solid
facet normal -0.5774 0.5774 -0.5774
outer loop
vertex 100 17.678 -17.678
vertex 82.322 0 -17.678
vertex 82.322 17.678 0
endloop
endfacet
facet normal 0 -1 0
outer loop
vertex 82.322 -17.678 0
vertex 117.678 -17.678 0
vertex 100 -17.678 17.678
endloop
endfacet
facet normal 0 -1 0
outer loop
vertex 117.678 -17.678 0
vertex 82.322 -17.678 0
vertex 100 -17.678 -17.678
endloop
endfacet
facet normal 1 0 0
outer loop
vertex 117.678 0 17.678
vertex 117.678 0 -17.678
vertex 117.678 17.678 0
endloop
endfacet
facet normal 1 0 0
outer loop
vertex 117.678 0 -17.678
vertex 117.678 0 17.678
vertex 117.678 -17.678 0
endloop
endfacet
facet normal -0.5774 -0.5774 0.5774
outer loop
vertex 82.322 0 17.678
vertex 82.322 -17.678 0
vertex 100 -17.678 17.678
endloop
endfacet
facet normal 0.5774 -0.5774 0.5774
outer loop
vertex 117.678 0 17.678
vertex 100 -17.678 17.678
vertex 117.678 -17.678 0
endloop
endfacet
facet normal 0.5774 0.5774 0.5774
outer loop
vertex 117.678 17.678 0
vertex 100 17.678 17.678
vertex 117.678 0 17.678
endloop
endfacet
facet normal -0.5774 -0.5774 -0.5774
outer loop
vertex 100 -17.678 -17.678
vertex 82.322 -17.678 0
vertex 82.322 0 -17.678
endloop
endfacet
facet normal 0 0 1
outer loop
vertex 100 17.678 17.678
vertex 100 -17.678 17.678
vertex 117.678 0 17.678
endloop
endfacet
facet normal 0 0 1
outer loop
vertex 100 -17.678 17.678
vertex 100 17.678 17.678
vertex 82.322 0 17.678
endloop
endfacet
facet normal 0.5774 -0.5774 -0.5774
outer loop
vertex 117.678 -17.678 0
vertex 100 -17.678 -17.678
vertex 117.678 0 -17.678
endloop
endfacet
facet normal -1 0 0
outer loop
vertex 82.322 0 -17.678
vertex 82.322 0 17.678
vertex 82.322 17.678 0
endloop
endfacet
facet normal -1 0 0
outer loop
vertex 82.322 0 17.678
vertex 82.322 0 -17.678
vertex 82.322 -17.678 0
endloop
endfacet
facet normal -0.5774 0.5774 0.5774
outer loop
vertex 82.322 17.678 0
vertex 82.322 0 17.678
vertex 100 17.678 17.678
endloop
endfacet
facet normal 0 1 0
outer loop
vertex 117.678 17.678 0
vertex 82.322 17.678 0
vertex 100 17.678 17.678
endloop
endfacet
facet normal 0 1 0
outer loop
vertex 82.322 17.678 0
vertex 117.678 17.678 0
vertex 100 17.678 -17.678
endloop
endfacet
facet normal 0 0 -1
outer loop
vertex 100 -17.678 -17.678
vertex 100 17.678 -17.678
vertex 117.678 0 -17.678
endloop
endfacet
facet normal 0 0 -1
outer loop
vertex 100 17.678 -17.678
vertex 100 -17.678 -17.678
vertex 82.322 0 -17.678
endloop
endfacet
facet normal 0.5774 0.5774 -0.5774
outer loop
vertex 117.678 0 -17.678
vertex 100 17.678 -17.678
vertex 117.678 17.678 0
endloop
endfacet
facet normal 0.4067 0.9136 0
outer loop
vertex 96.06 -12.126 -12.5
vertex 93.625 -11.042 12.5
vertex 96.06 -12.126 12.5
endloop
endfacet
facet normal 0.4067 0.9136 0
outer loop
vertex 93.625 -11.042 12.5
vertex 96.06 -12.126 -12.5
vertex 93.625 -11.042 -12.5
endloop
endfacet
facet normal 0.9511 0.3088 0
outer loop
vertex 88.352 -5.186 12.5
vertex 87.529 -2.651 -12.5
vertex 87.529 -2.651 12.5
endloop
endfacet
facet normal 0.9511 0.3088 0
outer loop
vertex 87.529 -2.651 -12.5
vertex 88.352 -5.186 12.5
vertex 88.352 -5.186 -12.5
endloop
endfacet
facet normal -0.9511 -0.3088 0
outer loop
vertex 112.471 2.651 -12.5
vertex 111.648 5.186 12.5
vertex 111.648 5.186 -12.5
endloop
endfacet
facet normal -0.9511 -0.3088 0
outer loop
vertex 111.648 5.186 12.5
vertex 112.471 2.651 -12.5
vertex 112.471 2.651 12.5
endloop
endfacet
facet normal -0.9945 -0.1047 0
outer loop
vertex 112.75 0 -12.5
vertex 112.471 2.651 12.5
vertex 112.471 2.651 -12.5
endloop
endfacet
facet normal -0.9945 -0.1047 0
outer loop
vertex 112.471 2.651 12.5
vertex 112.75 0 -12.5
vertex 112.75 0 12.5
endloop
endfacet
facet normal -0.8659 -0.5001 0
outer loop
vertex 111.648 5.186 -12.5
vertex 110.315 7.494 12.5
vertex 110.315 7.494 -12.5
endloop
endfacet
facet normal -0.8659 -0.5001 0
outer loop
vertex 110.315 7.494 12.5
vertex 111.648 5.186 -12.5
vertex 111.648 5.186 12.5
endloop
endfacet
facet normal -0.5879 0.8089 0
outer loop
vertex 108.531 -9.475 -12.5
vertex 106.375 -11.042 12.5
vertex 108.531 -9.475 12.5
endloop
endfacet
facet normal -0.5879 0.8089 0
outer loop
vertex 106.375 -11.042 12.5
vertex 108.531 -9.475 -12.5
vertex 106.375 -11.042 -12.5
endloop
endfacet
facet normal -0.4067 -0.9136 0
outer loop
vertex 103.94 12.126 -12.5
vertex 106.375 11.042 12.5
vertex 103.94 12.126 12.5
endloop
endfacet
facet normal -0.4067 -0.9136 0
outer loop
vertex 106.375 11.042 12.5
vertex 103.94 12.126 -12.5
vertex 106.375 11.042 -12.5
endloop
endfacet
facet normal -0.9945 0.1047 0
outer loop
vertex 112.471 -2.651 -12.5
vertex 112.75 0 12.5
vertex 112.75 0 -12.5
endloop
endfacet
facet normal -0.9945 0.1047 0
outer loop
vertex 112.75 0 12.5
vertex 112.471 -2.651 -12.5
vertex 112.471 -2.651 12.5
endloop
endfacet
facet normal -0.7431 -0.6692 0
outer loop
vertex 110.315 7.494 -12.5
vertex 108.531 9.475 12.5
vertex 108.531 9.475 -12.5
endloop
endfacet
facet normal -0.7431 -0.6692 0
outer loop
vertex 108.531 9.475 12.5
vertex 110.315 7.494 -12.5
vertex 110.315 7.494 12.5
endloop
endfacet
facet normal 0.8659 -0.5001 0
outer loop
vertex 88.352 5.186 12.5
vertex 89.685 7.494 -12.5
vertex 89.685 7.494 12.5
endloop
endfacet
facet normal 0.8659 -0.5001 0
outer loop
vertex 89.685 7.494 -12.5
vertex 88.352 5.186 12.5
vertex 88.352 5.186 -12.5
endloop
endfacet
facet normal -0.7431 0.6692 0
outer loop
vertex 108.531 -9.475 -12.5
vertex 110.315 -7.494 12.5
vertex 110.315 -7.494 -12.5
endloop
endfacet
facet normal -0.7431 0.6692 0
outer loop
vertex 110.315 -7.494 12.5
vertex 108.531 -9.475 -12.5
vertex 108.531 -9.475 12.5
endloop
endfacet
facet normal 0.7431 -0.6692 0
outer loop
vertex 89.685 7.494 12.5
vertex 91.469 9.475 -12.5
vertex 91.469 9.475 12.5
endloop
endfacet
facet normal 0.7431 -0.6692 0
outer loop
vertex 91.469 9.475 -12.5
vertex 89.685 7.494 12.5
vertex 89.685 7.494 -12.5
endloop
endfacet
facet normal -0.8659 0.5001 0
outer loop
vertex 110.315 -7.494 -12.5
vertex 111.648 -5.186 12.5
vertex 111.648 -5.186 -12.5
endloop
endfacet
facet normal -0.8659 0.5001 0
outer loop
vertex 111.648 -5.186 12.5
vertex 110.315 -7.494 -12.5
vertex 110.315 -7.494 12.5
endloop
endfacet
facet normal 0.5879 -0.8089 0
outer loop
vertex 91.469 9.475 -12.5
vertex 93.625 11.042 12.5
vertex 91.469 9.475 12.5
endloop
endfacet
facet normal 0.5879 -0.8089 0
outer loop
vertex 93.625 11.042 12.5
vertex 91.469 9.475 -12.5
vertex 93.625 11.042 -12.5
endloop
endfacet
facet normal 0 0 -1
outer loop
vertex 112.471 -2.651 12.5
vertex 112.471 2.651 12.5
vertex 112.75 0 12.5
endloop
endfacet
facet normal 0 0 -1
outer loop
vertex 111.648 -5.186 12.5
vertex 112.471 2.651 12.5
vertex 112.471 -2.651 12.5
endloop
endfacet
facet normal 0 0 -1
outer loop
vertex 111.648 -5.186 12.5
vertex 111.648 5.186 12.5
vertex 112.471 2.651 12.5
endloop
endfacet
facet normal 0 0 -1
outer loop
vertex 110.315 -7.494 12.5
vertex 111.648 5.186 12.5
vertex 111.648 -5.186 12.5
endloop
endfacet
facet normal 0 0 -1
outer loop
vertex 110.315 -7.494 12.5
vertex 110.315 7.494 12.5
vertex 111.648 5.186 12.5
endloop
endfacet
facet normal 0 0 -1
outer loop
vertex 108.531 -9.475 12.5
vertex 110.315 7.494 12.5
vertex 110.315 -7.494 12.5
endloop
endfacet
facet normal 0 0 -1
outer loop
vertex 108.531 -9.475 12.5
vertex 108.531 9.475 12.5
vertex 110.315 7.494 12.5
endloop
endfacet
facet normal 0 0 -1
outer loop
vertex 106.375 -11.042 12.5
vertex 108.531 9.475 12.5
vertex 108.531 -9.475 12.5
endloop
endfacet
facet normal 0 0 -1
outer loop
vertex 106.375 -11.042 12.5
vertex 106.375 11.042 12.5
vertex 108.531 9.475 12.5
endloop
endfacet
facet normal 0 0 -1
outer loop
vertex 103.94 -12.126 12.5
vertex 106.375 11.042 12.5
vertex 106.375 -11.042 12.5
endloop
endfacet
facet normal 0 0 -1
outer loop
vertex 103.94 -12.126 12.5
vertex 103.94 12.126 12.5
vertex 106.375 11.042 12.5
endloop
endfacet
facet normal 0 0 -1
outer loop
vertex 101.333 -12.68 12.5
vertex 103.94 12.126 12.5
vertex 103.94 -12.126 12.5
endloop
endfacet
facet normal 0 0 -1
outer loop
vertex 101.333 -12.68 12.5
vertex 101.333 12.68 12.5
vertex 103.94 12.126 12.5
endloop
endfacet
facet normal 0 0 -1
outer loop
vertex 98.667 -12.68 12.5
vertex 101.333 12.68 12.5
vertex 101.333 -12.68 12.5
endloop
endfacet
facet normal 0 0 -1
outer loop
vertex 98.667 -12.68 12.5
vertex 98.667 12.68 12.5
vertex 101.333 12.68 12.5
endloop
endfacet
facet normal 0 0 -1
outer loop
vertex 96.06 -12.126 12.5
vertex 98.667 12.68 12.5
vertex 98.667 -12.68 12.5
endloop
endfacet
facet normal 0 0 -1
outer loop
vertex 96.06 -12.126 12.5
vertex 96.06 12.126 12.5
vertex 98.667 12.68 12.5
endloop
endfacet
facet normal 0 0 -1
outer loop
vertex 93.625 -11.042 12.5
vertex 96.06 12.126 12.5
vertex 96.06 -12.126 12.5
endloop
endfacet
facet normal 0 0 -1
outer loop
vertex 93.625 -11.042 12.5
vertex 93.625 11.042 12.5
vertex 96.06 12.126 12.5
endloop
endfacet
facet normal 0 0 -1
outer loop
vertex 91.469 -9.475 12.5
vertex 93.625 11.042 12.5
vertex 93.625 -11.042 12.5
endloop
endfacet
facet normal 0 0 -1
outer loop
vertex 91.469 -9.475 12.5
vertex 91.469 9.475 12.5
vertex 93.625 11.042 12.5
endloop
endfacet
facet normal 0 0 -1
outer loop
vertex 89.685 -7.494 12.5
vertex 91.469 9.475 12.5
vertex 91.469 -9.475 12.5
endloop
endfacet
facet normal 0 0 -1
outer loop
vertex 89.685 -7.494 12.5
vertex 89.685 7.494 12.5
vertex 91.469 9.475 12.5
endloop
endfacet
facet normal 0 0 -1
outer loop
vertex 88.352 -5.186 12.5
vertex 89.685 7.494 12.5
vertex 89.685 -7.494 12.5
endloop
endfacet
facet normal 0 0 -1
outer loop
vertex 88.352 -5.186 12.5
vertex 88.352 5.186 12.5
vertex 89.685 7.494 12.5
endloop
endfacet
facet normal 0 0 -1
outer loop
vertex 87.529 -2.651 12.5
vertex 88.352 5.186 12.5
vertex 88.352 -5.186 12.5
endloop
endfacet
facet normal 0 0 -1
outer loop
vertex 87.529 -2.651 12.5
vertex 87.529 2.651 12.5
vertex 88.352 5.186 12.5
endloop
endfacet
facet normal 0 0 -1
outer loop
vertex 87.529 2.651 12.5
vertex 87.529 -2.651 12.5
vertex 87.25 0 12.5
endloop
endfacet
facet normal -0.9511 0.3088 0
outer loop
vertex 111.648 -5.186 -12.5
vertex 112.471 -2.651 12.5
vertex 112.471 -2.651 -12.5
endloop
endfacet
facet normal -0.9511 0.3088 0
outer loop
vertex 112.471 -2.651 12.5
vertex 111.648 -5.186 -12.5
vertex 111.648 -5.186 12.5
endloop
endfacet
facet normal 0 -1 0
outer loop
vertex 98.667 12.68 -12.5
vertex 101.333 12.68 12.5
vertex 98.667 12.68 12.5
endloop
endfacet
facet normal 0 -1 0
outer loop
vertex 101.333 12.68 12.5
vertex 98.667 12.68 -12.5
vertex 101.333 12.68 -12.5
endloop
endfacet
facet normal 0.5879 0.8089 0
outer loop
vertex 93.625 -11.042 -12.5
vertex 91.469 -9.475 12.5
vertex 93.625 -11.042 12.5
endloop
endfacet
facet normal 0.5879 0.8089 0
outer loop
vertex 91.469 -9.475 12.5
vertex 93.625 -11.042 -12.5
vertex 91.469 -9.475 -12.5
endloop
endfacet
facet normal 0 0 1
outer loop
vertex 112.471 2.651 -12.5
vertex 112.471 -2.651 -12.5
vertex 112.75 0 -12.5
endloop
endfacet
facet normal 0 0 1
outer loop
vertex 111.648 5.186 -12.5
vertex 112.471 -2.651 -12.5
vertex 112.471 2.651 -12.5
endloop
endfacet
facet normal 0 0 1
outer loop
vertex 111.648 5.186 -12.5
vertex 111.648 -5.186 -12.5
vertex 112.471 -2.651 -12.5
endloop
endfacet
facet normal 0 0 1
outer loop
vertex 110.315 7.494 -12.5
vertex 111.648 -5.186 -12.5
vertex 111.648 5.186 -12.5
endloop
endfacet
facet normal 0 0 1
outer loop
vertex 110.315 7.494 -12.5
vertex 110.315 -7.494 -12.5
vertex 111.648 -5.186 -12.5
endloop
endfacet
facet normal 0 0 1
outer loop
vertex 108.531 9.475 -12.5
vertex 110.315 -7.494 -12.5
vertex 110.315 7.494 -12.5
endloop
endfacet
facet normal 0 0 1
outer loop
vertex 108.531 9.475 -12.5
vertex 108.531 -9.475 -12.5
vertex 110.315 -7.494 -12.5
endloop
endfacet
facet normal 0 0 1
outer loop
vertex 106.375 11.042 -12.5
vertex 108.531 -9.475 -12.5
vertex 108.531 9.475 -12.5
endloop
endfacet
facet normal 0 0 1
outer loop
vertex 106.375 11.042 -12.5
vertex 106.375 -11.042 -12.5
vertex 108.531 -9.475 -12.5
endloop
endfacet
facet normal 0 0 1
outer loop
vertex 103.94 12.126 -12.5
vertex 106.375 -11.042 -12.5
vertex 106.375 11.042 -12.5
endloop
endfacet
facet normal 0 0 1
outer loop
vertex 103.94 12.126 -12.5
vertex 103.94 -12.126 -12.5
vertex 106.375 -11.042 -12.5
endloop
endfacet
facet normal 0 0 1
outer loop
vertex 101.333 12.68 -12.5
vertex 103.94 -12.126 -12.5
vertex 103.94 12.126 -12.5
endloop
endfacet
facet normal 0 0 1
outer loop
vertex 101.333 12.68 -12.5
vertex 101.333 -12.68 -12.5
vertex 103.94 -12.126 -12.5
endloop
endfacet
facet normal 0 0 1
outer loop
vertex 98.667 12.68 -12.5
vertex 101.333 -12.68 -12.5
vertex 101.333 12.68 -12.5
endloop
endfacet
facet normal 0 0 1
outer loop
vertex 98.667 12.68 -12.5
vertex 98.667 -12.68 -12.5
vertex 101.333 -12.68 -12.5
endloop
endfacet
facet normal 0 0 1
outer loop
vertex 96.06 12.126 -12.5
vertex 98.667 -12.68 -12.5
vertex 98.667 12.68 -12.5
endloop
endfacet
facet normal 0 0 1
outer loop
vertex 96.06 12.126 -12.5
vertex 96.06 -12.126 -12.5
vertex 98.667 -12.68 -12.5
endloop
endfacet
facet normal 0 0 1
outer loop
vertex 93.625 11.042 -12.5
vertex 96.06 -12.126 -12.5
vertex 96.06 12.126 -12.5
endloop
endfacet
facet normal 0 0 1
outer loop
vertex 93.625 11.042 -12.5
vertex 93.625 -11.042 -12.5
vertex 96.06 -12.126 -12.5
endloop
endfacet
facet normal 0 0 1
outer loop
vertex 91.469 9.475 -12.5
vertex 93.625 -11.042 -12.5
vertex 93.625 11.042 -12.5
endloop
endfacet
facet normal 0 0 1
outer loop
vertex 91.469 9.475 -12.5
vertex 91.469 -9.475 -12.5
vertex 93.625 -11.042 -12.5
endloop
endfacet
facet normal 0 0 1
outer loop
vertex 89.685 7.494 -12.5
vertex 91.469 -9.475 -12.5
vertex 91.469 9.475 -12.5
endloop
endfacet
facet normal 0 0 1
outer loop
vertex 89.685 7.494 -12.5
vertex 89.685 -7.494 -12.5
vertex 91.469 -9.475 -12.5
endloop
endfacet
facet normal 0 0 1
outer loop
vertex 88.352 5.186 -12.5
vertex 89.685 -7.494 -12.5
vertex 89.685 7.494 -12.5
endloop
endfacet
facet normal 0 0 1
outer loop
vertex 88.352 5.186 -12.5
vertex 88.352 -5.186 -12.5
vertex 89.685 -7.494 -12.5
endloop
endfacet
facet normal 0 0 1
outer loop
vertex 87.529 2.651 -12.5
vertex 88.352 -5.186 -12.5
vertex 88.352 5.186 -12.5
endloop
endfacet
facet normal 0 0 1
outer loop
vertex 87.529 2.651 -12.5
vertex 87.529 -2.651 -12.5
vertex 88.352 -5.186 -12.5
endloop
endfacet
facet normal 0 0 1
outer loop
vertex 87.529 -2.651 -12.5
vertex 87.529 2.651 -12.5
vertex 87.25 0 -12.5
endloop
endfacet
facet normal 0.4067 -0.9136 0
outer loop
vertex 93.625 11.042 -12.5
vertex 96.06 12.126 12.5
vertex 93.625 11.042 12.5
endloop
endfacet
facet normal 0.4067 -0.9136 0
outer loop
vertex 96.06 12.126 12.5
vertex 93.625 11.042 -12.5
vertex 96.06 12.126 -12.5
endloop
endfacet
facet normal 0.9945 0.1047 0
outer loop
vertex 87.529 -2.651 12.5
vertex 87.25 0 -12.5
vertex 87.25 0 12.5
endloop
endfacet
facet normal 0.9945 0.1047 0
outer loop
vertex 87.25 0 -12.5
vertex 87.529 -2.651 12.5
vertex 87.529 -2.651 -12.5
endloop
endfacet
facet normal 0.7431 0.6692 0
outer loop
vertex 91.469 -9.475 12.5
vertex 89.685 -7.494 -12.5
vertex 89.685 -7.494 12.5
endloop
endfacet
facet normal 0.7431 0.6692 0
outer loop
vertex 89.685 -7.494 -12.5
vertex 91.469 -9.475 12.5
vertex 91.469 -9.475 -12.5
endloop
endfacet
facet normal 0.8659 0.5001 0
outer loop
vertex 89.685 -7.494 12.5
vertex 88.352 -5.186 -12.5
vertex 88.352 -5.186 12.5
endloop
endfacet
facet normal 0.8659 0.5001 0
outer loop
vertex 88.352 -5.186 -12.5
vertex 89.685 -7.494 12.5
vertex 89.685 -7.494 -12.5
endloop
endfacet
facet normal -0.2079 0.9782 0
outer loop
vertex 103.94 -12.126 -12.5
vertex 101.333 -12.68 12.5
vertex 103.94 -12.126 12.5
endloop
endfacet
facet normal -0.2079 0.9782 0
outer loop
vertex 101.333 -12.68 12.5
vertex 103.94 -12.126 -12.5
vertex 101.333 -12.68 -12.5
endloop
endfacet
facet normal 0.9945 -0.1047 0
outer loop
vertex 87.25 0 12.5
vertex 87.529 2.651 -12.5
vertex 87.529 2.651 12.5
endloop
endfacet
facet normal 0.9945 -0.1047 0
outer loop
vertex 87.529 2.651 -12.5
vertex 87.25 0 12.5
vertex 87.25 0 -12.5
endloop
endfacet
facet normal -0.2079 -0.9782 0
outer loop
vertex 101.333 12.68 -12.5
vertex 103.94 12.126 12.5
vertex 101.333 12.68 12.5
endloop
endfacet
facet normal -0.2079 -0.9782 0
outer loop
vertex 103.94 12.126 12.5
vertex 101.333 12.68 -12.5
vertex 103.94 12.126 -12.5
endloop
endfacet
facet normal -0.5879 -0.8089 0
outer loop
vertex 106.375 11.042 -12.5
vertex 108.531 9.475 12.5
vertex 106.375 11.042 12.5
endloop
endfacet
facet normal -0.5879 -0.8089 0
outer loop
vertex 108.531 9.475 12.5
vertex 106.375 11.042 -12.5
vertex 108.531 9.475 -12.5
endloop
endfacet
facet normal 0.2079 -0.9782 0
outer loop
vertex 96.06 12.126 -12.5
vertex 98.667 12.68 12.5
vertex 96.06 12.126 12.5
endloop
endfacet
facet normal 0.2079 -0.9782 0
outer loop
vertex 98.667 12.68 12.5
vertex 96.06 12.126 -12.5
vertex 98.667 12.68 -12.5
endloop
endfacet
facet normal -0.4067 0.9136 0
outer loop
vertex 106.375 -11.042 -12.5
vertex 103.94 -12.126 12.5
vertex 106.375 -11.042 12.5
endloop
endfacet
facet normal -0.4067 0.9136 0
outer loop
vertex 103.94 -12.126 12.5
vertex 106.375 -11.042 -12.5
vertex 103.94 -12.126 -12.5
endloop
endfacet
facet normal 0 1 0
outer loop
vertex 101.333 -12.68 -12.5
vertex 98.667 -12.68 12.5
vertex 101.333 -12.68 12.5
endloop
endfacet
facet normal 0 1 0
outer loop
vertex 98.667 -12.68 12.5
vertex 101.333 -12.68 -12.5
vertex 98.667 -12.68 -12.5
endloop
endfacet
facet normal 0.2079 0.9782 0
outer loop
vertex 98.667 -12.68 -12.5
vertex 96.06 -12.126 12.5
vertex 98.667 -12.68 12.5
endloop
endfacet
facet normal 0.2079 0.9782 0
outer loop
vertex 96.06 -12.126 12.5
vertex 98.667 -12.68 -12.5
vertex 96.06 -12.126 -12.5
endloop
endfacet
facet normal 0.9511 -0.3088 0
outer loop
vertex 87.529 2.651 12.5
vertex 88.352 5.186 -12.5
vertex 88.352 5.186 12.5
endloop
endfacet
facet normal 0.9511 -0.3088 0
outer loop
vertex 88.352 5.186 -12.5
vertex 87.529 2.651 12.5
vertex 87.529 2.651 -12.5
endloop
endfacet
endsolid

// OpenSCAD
// source:  http://dmccooey.com/polyhedra/RhombicDodecahedron.txt
// generated by  http://kitwallace.co.uk/3d/solid-index.xq
C0 = 0.530330085889910643300633271579;
C1 = 1.06066017177982128660126654316;

vertices = [
[0.0, 0.0,  C1],
[0.0, 0.0, -C1],
[ C1, 0.0, 0.0],
[-C1, 0.0, 0.0],
[0.0,  C1, 0.0],
[0.0, -C1, 0.0],
[ C0,  C0,  C0],
[ C0,  C0, -C0],
[ C0, -C0,  C0],
[ C0, -C0, -C0],
[-C0,  C0,  C0],
[-C0,  C0, -C0],
[-C0, -C0,  C0],
[-C0, -C0, -C0]];
faces = [
[  2 ,  8,  0,  6],
[  4 ,  7,  2,  6],
[  0 , 10,  4,  6],
[  2 ,  7,  1,  9],
[  5 ,  8,  2,  9],
[  1 , 13,  5,  9],
[  3 , 13,  1, 11],
[  4 , 10,  3, 11],
[  1 ,  7,  4, 11],
[  3 , 10,  0, 12],
[  5 , 13,  3, 12],
[  0 ,  8,  5, 12]];



module d12 (){
    polyhedron(vertices , faces, convexity=1);
}

//translate([0, 0, C1]) d12();
//translate([0, 0, -C1]) d12();
//
//translate([C1, 0, 0]) d12();
//translate([-C1, 0, 0]) d12();
//
//translate([0, C1, 0]) d12();
//translate([0, -C1, 0]) d12();





module Cubo (){
    C0 = 0.7071067811865475244008443621048;

    vertices = [
    [ C0, 0.0,  C0],
    [ C0, 0.0, -C0],
    [-C0, 0.0,  C0],
    [-C0, 0.0, -C0],
    [ C0,  C0, 0.0],
    [ C0, -C0, 0.0],
    [-C0,  C0, 0.0],
    [-C0, -C0, 0.0],
    [0.0,  C0,  C0],
    [0.0,  C0, -C0],
    [0.0, -C0,  C0],
    [0.0, -C0, -C0]];
    faces = [
    [  4 ,  1,  5,  0],
    [ 10 ,  2,  8,  0],
    [  3 ,  6,  2,  7],
    [ 10 ,  5, 11,  7],
    [  3 , 11,  1,  9],
    [  4 ,  8,  6,  9],
    [  8 ,  4,  0],
    [ 11 ,  5,  1],
    [ 10 ,  7,  2],
    [  9 ,  6,  3],
    [  9 ,  1,  4],
    [ 10 ,  0,  5],
    [  8 ,  2,  6],
    [ 11 ,  3,  7]];
    polyhedron(vertices , faces, convexity=1);
    
}


ball_diameter = 25.5;
ball_depth = 25;

module rhom(){
    difference() {
        rotate(45, [1, 0, 0]) scale(25) d12();
        translate([0, 0, -1]) sphere(d = ball_diameter);
        translate([0, 0, -1]) cylinder(h=ball_diameter/2, d=ball_diameter,center=false);
    }
}




module cuboct(){
    translate([100, 0, 0])
    difference() {
        scale(25) Cubo();
        cylinder(h=ball_depth, d=ball_diameter,center=true);
    }
}


which=2;
if(which==0 || which ==1) rhom();
if(which==0 || which==2) cuboct()       ;



rhombohedron_verts = [
    [0, 0, 0],      // 0
    [C0, C0, C0],   // 1
    [0, 0, C1],     // 2
    [-C0, C0, C0],  // 3
    [0, C1, 0],     // 4
    [C0, C0, -C0],  // 5
    [C1, 0, 0],     // 6
    [C0, -C0, C0]   // 7
];
rhombohedron_faces = [
    [1, 6, 7, 2],
    [1, 2, 3, 4 ],
    [1, 4, 5, 6],
    [0, 7, 2, 3],
    [0, 3, 4, 5],
    [0, 5, 6, 7],

    []
];


module rhombohedron(){
    

    
    polyhedron(rhombohedron_verts , rhombohedron_faces, convexity=1);
    
}


//translate([0, C1, 0]){
//
//translate([0, 0, 0]) rhombohedron();
//rotate(90, [0, 0, 1]) mirror([0, 0, 1])  rhombohedron();
//}
//
////mirror([0, -C1, 0]) translate([0, C1, 0]){
////
////translate([0, 0, 0]) rhombohedron();
////rotate(90, [0, 0, 1]) mirror([0, 0, 1])  rhombohedron();
////}
//
//
//mirror([1, 1, 0]) translate([0, C1, 0]){
//
//translate([0, 0, 0]) rhombohedron();
//rotate(90, [0, 0, 1]) mirror([0, 0, 1])  rhombohedron();
//}
//
//mirror([0, -1, 0]) translate([0, C1, 0]){
//
//translate([0, 0, 0]) rhombohedron();
//rotate(90, [0, 0, 1]) mirror([0, 0, 1])  rhombohedron();
//}


//translate([C0, -C0, C0]) rhombohedron();
//translate([C0, -C0, C0]) rhombohedron();


//mirror([0, 0, 0]) mirror([ 1, 1, 0]) rhombohedron();



//mirror([0, 0, 1]) mirror([ 1, 1, 0]) rhombohedron();

//translate([-C0, -C0, C0]) rhombohedron();
